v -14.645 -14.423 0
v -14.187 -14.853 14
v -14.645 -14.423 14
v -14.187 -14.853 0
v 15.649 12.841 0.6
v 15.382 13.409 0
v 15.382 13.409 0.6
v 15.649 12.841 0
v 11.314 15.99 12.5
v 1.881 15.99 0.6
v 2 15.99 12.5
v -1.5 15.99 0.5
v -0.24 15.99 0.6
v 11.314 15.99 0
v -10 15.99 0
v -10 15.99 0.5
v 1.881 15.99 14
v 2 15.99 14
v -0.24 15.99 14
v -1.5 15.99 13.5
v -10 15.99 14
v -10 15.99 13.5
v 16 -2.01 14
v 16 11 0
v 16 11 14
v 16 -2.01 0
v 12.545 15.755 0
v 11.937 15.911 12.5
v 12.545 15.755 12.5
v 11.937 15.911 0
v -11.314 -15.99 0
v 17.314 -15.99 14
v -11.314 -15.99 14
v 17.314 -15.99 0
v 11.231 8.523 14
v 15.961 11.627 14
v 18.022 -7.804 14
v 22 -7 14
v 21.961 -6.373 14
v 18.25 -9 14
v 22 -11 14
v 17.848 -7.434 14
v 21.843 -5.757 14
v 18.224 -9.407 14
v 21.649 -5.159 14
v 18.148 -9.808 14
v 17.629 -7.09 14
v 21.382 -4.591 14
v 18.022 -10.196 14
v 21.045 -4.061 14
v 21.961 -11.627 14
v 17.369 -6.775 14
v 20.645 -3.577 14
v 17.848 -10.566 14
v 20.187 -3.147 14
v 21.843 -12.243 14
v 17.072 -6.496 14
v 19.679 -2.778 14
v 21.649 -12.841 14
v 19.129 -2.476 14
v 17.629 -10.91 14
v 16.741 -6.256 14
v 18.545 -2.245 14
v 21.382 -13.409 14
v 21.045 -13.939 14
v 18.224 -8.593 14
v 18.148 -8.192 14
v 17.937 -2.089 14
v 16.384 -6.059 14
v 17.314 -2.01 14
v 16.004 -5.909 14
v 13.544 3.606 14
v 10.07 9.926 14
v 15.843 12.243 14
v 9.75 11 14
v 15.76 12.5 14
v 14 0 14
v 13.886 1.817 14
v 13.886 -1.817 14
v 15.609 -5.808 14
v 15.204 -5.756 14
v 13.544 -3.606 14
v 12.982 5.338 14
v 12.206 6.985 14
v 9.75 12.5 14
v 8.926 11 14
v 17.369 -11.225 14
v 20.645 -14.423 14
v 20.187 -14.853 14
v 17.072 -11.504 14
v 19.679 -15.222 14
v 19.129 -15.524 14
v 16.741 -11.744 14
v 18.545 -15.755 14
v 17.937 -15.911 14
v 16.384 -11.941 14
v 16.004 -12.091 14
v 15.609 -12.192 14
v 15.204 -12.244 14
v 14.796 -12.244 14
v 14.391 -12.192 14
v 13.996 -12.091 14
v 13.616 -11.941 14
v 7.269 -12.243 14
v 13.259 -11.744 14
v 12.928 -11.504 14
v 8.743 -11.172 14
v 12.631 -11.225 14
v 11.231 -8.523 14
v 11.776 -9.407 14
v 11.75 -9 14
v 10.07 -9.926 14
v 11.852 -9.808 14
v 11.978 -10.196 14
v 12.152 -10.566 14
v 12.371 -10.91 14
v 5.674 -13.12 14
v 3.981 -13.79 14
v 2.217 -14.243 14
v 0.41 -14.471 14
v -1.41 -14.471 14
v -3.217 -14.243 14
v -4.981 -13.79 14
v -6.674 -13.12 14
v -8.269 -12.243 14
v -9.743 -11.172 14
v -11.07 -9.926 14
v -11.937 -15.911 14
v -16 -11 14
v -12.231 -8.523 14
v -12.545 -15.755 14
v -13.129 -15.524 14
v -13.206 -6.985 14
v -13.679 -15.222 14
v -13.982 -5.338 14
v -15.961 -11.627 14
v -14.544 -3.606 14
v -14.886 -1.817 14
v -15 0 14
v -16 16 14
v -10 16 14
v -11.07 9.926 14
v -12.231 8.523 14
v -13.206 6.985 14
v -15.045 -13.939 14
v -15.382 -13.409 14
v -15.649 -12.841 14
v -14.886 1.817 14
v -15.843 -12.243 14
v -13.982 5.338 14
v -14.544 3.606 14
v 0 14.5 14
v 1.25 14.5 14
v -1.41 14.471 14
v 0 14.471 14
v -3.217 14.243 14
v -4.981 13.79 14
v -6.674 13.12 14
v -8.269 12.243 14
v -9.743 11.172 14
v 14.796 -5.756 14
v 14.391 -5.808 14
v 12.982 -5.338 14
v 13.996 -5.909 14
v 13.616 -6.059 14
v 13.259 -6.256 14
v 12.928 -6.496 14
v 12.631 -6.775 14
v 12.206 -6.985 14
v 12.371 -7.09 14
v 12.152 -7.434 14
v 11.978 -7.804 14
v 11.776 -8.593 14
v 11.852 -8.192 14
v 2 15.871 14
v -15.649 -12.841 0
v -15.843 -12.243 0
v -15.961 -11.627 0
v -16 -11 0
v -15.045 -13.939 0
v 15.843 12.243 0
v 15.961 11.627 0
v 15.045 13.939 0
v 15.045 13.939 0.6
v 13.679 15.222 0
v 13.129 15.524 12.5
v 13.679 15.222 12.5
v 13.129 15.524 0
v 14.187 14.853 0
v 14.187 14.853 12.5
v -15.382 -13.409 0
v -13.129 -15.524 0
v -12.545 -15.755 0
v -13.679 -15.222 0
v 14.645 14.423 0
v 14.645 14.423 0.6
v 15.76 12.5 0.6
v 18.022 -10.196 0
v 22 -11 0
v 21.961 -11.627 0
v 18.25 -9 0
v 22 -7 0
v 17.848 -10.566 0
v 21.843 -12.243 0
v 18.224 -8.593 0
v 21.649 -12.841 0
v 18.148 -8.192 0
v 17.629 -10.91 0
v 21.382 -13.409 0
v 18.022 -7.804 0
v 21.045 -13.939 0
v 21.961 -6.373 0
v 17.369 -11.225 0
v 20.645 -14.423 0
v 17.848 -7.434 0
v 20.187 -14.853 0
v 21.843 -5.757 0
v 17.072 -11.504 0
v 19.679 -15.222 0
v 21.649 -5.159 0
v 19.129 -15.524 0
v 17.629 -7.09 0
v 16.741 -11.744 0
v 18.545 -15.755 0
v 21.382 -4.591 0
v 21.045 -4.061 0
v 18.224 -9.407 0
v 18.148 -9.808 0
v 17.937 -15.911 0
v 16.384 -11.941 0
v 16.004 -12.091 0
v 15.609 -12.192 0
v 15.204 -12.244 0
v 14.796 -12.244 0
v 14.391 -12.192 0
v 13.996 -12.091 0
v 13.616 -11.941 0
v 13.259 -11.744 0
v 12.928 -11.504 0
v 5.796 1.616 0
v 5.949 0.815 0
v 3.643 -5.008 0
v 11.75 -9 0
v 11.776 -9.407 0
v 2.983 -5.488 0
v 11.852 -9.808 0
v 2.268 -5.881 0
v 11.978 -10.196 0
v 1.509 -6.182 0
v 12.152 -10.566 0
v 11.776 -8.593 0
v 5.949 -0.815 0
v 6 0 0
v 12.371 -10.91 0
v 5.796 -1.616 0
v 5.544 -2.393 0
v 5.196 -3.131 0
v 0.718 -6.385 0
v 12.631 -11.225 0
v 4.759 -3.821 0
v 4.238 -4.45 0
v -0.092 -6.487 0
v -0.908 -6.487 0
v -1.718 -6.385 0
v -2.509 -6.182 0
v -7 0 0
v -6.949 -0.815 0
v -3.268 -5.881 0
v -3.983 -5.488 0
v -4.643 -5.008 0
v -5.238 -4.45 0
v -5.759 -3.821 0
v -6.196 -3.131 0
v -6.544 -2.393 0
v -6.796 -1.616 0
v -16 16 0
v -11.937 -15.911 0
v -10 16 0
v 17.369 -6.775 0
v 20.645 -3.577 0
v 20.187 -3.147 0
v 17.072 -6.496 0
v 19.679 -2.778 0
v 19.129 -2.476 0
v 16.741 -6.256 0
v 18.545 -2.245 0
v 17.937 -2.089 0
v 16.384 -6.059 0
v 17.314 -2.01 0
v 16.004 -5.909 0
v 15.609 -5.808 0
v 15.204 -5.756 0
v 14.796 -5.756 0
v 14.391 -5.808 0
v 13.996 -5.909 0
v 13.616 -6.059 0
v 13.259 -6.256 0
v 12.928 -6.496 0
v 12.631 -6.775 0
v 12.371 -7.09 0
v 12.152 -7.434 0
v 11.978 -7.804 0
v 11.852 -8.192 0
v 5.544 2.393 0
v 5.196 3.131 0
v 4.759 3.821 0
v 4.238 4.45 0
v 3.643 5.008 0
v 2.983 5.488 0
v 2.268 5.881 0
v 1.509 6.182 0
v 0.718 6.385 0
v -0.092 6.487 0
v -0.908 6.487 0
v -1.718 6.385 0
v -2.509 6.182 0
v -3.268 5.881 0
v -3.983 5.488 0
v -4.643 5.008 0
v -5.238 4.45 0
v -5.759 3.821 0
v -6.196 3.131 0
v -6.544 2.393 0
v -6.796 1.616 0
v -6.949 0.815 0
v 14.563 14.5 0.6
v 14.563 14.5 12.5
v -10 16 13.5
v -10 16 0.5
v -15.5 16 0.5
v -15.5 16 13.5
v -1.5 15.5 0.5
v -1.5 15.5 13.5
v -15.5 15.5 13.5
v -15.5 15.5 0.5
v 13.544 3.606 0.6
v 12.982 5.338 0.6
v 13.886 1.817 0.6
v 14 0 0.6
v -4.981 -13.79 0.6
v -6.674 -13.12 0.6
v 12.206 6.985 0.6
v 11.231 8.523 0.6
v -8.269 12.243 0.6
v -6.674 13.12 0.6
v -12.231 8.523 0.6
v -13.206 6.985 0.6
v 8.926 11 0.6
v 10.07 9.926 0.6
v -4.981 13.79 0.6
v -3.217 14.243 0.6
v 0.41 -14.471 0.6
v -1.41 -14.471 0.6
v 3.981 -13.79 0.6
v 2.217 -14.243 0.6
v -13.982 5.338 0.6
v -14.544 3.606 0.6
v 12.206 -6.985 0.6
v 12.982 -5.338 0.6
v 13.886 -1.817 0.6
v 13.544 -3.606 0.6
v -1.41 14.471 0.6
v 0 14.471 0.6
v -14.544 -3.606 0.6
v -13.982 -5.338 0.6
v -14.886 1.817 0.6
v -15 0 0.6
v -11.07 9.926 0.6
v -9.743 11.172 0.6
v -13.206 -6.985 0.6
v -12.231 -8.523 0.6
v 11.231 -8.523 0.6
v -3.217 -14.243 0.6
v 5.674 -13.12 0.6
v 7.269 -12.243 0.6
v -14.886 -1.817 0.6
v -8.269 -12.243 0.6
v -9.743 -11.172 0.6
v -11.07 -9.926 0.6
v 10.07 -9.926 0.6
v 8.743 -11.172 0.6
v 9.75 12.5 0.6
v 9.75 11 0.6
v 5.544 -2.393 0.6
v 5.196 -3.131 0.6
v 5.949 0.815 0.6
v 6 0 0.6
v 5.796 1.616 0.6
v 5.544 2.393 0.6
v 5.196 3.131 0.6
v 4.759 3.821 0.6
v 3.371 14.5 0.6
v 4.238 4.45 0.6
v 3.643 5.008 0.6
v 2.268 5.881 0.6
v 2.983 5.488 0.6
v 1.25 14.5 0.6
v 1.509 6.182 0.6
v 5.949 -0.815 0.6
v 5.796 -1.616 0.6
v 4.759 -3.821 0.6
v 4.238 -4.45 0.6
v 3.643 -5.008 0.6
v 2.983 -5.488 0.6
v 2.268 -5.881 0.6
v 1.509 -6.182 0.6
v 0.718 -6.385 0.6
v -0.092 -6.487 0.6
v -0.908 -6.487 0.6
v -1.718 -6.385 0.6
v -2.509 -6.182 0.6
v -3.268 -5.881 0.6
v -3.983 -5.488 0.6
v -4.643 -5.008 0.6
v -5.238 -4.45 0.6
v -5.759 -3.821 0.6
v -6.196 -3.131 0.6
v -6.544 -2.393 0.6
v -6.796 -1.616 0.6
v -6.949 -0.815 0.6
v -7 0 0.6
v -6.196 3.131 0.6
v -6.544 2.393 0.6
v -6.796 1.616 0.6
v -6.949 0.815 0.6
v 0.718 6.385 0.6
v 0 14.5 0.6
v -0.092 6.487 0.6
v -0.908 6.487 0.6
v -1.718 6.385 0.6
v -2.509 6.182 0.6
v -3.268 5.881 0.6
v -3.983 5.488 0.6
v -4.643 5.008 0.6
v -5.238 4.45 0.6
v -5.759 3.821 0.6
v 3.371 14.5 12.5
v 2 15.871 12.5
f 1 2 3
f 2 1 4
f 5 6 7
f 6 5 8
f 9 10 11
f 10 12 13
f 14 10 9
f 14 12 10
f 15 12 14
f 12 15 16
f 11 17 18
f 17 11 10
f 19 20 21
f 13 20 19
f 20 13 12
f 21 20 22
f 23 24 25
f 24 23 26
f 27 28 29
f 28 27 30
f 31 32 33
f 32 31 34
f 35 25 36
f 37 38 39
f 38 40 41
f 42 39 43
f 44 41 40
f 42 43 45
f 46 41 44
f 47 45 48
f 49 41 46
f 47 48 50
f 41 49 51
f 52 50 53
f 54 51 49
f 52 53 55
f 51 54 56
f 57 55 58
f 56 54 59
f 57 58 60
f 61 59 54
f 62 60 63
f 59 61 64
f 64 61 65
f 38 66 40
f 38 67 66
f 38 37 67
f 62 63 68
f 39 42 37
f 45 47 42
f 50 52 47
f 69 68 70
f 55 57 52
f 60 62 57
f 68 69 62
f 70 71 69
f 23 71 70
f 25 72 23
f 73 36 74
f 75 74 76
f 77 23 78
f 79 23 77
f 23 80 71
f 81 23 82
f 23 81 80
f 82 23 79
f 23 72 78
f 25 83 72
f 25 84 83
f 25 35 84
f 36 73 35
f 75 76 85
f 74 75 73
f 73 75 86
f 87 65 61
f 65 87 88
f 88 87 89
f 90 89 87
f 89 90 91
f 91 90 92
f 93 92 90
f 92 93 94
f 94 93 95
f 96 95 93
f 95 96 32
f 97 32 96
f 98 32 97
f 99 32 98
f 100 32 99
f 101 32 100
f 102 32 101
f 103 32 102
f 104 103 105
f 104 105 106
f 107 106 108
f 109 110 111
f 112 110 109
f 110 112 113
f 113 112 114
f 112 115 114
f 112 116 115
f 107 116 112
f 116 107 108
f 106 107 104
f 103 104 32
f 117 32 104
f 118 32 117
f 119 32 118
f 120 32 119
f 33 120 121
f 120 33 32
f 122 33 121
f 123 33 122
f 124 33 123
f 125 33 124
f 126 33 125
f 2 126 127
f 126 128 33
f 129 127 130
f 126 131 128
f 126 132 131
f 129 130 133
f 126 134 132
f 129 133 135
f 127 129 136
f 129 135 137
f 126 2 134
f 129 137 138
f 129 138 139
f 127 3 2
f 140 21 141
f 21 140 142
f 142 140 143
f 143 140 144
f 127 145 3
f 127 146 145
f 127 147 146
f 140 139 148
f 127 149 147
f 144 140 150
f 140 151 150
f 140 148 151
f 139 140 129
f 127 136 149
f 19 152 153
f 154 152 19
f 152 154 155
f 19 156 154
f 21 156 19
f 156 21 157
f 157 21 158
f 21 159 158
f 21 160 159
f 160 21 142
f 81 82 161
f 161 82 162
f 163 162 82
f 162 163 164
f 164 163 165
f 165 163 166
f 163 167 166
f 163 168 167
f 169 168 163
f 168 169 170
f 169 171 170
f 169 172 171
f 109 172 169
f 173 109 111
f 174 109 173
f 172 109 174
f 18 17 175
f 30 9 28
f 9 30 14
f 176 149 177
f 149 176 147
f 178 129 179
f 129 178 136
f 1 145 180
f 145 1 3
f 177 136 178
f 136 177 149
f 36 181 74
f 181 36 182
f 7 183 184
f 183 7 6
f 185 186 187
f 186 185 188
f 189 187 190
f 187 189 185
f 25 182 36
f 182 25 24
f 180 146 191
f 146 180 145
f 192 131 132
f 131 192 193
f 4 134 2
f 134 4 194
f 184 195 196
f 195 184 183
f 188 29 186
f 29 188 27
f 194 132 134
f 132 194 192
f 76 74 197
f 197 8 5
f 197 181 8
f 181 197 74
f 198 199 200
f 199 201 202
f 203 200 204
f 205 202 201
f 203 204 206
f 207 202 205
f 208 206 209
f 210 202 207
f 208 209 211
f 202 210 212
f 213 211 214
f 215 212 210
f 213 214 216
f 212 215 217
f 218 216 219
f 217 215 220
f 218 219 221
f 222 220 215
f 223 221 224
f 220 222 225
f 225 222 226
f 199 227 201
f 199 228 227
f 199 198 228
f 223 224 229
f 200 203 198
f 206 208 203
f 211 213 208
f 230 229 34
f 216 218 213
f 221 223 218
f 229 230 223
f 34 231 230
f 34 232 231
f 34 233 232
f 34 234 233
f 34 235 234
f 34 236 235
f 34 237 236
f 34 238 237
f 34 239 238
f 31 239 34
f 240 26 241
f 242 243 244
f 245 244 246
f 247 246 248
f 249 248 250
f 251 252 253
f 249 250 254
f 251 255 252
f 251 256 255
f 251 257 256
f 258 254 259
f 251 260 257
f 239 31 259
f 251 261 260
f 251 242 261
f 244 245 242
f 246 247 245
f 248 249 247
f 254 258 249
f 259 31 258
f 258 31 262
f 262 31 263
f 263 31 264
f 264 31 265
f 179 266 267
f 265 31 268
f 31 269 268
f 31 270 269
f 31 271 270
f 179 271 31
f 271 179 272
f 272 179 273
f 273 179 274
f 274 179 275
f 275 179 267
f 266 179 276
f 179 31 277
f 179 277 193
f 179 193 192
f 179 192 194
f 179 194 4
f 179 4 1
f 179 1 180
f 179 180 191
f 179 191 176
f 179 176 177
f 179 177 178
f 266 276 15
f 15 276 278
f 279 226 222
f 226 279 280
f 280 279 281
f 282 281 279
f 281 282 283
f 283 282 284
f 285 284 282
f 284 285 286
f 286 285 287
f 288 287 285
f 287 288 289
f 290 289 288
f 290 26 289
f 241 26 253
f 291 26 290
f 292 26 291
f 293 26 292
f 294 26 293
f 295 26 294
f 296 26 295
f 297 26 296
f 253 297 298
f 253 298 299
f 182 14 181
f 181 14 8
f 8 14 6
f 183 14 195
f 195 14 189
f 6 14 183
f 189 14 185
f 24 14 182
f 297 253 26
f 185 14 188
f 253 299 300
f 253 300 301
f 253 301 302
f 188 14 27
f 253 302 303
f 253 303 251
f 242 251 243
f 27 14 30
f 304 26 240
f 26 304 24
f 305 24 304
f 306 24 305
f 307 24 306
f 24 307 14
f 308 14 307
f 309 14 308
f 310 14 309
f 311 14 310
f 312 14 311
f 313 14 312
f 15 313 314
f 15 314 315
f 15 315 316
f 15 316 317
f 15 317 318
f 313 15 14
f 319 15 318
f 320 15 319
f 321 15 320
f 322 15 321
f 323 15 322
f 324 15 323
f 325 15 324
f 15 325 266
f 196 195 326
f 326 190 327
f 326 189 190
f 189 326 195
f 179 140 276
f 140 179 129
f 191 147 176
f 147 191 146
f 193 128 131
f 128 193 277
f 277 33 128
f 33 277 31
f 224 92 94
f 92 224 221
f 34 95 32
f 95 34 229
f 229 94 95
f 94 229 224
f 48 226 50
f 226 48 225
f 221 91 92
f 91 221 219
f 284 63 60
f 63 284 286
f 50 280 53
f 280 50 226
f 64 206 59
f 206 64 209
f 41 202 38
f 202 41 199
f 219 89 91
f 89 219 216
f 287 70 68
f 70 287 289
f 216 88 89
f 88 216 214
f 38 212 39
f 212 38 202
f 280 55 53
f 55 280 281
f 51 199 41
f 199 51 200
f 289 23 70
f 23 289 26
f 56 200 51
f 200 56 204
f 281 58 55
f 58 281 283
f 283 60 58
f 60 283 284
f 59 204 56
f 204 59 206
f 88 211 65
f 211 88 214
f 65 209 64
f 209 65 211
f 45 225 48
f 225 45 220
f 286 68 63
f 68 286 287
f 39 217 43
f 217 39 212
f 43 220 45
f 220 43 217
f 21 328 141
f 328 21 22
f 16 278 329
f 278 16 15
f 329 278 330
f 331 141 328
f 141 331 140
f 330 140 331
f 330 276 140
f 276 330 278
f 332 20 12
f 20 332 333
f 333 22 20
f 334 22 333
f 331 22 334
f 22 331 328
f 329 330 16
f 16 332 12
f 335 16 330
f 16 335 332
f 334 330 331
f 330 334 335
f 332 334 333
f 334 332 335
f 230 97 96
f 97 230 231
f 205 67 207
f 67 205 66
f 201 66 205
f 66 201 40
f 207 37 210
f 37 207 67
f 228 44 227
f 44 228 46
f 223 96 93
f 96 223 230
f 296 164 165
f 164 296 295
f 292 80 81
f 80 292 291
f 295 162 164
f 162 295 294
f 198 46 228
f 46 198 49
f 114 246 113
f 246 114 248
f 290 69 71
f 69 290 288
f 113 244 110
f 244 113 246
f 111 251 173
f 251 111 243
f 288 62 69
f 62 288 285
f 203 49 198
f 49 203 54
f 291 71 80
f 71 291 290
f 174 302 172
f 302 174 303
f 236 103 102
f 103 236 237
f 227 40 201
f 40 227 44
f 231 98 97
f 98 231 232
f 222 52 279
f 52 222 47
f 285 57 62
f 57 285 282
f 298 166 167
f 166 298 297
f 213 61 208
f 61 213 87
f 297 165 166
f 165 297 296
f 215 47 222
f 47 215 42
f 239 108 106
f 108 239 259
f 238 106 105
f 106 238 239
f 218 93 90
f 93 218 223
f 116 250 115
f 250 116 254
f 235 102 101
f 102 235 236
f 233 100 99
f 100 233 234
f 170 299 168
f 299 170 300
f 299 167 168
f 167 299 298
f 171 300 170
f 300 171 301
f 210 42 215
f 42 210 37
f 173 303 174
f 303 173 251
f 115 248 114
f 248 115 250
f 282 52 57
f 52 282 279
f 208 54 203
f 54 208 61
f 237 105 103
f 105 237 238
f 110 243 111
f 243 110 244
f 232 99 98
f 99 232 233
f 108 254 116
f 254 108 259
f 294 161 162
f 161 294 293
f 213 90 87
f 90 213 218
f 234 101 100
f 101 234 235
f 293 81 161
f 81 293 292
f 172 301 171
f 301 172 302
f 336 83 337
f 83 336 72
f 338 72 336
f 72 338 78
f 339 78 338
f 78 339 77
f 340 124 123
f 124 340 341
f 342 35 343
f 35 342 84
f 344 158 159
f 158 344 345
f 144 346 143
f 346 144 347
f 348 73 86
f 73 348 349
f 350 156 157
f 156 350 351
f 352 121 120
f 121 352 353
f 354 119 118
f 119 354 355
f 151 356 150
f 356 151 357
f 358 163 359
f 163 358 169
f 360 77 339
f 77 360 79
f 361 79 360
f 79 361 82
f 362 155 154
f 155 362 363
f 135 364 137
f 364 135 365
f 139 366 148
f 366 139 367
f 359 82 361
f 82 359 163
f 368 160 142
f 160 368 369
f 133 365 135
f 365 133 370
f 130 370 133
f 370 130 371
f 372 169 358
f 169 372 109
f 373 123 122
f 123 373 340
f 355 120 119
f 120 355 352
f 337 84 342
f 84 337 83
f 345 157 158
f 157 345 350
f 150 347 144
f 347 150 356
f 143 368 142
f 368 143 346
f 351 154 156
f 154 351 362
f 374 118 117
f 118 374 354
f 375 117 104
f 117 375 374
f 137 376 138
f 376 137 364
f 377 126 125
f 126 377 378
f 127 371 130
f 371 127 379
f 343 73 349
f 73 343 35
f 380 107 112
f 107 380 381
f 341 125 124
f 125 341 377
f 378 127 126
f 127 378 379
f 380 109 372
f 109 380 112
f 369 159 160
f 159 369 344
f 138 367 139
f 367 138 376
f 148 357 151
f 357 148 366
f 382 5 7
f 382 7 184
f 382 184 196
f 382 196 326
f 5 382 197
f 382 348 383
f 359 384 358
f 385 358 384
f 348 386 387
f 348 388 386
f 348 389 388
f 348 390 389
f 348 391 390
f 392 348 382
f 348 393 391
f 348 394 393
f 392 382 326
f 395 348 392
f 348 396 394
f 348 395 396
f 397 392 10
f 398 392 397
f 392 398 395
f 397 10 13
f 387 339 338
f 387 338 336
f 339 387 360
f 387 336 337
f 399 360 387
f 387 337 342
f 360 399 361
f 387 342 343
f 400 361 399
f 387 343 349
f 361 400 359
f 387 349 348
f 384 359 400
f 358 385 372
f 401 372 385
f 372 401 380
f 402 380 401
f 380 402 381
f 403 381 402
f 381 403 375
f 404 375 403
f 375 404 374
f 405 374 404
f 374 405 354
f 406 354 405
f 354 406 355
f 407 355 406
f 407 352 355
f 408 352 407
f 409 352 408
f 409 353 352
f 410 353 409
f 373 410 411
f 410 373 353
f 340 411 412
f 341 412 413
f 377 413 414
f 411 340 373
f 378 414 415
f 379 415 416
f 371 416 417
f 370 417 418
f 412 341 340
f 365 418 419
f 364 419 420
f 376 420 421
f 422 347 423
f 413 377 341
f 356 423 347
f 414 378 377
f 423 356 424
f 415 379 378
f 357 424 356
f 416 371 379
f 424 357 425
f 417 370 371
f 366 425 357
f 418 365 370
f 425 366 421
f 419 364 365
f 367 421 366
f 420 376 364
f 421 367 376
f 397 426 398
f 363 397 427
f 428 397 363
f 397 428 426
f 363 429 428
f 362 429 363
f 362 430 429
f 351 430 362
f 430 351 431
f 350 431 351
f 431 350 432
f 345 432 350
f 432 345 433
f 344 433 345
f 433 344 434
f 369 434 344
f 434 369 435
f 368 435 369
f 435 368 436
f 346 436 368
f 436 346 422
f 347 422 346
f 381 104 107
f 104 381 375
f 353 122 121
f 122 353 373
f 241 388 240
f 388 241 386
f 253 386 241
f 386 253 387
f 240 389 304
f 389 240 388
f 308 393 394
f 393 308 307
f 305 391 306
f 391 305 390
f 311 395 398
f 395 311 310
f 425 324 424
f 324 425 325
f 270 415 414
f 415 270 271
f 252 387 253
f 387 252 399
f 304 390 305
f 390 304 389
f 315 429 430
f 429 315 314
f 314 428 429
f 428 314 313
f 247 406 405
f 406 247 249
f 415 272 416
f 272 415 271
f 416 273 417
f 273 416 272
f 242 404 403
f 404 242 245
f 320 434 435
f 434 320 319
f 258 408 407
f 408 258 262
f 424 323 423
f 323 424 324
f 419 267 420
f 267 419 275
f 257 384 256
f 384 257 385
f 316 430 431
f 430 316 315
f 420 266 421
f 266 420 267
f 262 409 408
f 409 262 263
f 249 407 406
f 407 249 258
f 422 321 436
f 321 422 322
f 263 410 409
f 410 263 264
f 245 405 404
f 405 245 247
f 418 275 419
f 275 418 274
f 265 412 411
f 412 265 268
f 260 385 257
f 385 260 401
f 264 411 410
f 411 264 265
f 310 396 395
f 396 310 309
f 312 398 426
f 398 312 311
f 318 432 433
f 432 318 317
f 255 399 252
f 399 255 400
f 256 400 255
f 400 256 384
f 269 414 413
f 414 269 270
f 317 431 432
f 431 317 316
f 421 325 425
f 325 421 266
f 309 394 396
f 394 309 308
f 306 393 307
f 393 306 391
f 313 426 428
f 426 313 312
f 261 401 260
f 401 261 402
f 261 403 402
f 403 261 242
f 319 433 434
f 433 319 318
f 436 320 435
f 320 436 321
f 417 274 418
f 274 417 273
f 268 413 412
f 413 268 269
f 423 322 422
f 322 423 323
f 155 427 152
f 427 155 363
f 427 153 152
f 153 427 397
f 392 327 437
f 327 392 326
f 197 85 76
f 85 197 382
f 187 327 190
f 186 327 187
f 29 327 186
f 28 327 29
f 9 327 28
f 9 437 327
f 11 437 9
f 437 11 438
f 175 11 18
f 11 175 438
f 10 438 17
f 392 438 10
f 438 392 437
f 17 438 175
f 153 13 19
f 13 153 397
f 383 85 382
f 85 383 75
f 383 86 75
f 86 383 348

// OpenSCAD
$fn = 50;


difference() {
	union() {
		hull() {
			translate(v = [-11.0000000000, 11.0000000000, 0]) {
				cylinder(h = 14, r = 5);
			}
			translate(v = [11.0000000000, 11.0000000000, 0]) {
				cylinder(h = 14, r = 5);
			}
			translate(v = [-11.0000000000, -11.0000000000, 0]) {
				cylinder(h = 14, r = 5);
			}
			translate(v = [11.0000000000, -11.0000000000, 0]) {
				cylinder(h = 14, r = 5);
			}
		}
		translate(v = [7.5000000000, -9.0000000000, 0]) {
			hull() {
				translate(v = [-9.5000000000, 2.0000000000, 0]) {
					cylinder(h = 14, r = 5);
				}
				translate(v = [9.5000000000, 2.0000000000, 0]) {
					cylinder(h = 14, r = 5);
				}
				translate(v = [-9.5000000000, -2.0000000000, 0]) {
					cylinder(h = 14, r = 5);
				}
				translate(v = [9.5000000000, -2.0000000000, 0]) {
					cylinder(h = 14, r = 5);
				}
			}
		}
		translate(v = [-16.0000000000, 10.0000000000, 0]) {
			cube(size = [6, 6, 14]);
		}
	}
	union() {
		translate(v = [-15.5000000000, 15.5000000000, 0.5000000000]) {
			cube(size = [14, 0.5000000000, 13.0000000000]);
		}
		translate(v = [15.0000000000, -9.0000000000, -50.0000000000]) {
			cylinder(h = 100, r = 3.2500000000);
		}
		translate(v = [-0.5000000000, 0.0000000000, 0.6000000000]) {
			cylinder(h = 16.4000000000, r = 14.5000000000);
		}
		translate(v = [-0.5000000000, 0.0000000000, -7.0000000000]) {
			cylinder(h = 14, r = 6.5000000000);
		}
		translate(v = [0.0000000000, 12.5000000000, 0.6000000000]) {
			cube(size = [16.0000000000, 2, 16.4000000000]);
		}
		translate(v = [2.0000000000, 12.5000000000, 12.5000000000]) {
			cube(size = [14.0000000000, 5, 1.5000000000]);
		}
		translate(v = [-3.0000000000, 18.7500000000, 0.6000000000]) {
			rotate(a = [0, 0, -45]) {
				cube(size = [10, 1.5000000000, 16.4000000000]);
			}
		}
		translate(v = [2.2500000000, 11.0000000000, 0.6000000000]) {
			cube(size = [7.5000000000, 2, 13.4000000000]);
		}
	}
}
